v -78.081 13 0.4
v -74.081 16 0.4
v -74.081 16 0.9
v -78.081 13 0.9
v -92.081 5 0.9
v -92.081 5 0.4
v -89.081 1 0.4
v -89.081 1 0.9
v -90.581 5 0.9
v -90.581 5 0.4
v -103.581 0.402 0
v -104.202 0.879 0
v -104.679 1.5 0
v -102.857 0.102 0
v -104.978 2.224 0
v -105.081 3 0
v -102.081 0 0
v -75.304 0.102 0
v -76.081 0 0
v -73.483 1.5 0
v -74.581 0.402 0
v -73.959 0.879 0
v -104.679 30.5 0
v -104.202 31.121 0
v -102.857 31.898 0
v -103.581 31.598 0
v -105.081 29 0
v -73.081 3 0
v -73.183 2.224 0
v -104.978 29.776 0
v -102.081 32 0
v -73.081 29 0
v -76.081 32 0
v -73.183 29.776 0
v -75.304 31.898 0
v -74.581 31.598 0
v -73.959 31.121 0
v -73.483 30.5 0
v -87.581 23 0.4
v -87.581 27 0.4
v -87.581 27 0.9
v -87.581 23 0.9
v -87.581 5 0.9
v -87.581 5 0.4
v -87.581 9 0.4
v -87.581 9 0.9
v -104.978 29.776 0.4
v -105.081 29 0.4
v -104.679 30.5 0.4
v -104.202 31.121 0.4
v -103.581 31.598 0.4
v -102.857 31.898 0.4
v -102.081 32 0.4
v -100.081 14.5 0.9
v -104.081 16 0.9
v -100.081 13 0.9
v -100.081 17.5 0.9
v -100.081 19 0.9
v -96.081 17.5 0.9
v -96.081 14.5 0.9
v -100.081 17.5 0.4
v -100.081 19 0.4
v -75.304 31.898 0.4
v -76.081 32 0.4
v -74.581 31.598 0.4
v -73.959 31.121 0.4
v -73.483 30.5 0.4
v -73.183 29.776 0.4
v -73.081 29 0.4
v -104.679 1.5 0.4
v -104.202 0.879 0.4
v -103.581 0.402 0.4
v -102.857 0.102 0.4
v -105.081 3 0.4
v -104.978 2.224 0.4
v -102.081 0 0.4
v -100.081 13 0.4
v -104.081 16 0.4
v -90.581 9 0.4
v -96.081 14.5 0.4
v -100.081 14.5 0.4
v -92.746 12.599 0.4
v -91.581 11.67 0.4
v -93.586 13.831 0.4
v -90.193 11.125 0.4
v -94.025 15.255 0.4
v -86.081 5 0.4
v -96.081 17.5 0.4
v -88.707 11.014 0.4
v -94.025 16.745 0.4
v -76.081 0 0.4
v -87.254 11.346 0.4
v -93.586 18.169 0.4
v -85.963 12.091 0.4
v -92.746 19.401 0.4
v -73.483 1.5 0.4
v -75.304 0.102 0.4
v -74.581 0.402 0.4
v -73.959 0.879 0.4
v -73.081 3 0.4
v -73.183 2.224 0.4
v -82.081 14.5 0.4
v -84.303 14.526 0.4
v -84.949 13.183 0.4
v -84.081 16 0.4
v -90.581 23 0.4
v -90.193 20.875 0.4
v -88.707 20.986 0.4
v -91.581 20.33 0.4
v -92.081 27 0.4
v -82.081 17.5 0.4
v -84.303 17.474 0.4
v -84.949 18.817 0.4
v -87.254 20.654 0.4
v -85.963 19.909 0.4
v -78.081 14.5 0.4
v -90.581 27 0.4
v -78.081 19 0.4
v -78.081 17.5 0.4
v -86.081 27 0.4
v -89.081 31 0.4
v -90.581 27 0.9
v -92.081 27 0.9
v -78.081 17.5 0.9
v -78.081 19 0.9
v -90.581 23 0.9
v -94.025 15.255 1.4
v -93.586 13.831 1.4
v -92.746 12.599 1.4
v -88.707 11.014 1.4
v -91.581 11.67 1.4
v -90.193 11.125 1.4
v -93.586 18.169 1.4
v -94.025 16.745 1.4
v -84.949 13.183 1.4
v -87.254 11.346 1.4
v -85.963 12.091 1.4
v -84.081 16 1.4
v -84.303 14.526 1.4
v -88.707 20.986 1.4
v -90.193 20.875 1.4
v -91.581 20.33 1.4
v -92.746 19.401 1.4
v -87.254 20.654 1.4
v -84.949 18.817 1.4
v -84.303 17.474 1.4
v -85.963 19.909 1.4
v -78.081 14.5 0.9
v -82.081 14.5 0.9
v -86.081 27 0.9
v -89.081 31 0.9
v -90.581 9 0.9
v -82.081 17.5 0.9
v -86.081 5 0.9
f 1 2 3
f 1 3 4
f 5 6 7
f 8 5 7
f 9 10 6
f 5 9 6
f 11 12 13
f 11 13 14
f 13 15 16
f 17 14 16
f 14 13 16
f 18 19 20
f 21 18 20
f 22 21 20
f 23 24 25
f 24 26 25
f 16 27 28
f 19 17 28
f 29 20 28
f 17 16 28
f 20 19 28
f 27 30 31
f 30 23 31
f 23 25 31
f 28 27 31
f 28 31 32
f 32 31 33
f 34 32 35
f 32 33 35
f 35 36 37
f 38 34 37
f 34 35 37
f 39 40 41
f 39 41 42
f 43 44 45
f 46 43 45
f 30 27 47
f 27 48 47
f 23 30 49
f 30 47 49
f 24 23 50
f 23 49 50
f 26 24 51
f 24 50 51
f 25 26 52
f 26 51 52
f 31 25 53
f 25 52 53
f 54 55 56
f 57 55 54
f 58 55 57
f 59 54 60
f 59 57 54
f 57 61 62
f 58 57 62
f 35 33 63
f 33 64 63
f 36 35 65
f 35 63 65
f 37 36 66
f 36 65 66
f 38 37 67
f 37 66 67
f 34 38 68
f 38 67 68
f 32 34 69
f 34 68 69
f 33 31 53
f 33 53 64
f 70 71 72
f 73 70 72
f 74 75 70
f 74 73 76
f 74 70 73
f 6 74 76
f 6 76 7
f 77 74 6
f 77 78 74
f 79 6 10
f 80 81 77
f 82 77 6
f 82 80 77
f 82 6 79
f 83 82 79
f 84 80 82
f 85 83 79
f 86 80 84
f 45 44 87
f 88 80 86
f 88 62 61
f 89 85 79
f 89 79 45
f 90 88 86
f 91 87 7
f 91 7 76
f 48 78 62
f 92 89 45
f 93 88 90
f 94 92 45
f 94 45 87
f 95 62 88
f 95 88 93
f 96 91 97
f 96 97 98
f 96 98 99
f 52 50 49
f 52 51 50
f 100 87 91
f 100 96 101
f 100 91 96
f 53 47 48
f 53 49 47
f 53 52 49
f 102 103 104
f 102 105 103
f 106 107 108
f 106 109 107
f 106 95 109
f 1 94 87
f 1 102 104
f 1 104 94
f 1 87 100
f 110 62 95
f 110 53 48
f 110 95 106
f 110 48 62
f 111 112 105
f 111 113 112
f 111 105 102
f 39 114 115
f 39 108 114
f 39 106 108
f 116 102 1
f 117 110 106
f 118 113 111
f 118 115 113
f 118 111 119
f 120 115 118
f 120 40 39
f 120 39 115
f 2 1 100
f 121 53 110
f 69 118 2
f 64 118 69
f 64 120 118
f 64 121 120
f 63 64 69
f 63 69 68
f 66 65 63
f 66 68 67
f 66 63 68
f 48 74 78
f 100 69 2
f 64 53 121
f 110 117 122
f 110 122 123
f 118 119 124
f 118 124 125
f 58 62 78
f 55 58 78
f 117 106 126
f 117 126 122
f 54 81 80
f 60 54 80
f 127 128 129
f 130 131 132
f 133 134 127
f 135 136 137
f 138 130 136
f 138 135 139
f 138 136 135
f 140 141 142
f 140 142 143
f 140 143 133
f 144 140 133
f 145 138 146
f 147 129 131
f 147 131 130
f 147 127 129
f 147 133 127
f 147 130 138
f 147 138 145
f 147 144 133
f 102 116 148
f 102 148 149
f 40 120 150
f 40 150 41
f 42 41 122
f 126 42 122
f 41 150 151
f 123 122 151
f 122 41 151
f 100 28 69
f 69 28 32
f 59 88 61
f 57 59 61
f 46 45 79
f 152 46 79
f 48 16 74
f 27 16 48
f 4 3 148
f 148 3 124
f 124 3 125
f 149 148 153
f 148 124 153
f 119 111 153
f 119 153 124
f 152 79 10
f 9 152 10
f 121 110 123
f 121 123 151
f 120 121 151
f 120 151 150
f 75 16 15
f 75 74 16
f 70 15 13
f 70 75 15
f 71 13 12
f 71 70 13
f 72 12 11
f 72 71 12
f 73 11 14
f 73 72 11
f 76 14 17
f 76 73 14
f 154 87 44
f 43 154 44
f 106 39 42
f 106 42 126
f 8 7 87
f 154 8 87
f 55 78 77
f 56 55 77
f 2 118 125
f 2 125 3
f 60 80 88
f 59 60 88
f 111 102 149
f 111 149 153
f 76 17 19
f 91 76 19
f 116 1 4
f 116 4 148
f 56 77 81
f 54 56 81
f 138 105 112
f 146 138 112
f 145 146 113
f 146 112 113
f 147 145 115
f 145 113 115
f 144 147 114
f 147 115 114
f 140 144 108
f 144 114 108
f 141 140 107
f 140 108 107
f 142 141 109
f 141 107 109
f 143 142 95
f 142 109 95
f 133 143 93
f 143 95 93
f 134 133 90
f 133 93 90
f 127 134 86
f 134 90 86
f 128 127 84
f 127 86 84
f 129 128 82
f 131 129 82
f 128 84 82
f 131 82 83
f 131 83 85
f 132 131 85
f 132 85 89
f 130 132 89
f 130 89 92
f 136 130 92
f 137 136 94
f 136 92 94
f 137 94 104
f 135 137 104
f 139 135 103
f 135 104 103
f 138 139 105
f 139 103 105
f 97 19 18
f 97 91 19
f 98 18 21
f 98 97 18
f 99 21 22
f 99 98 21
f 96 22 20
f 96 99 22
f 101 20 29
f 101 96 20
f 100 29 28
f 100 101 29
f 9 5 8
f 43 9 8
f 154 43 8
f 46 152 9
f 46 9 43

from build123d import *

# Parameters (mm, degrees)
SKETCH032_W  = 32
SKETCH032_H  = 32
PAD014_DEPTH = 0.4
PAD015_DEPTH = 0.5
PAD016_DEPTH = 0.5
SKETCH035_R  = 5
PAD017_DEPTH = 1
FILLET005_R  = 3


with BuildPart() as part:
    # Sketch032 → Pad014 (new body)
    with BuildSketch(Plane.XY):
        with Locations((-89.080673, 16)):
            Rectangle(SKETCH032_W, SKETCH032_H)
    extrude(amount=PAD014_DEPTH)

    # Sketch033 (on Face6 of Pad014) → Pad015 (join)
    with BuildSketch(Plane.XY.offset(0.4)):
        Polygon((-89.080673, 31), (-86.080673, 27), (-87.580673, 27), (-87.580673, 23), (-90.580673, 23), (-90.580673, 27), (-92.080673, 27), align=None)
        Polygon((-89.080673, 1), (-86.080673, 5), (-87.580673, 5), (-87.580673, 9), (-90.580673, 9), (-90.580673, 5), (-92.080673, 5), align=None)
    extrude(amount=PAD015_DEPTH)

    # Sketch034 (on Face5 of Pad015) → Pad016 (join)
    with BuildSketch(Plane.XY.offset(0.4)):
        Polygon((-74.080673, 16), (-78.080673, 13), (-78.080673, 14.5), (-82.080673, 14.5), (-82.080673, 17.5), (-78.080673, 17.5), (-78.080673, 19), align=None)
        Polygon((-104.080673, 16), (-100.080673, 13), (-100.080673, 14.5), (-96.080673, 14.5), (-96.080673, 17.5), (-100.080673, 17.5), (-100.080673, 19), align=None)
    extrude(amount=PAD016_DEPTH)

    # Sketch035 (on Face5 of Pad016) → Pad017 (join)
    with BuildSketch(Plane.XY.offset(0.4)):
        with Locations((-89.080673, 16)):
            Circle(SKETCH035_R)
    extrude(amount=PAD017_DEPTH)

    # Fillet005
    fillet005_edges = [part.edges().sort_by_distance(p)[0] for p in [
        (-105.080673, 0, 0.2),
        (-105.080673, 32, 0.2),
        (-73.080673, 32, 0.2),
        (-73.080673, 0, 0.2),
    ]]
    fillet(fillet005_edges, radius=FILLET005_R)


solid = part.part
